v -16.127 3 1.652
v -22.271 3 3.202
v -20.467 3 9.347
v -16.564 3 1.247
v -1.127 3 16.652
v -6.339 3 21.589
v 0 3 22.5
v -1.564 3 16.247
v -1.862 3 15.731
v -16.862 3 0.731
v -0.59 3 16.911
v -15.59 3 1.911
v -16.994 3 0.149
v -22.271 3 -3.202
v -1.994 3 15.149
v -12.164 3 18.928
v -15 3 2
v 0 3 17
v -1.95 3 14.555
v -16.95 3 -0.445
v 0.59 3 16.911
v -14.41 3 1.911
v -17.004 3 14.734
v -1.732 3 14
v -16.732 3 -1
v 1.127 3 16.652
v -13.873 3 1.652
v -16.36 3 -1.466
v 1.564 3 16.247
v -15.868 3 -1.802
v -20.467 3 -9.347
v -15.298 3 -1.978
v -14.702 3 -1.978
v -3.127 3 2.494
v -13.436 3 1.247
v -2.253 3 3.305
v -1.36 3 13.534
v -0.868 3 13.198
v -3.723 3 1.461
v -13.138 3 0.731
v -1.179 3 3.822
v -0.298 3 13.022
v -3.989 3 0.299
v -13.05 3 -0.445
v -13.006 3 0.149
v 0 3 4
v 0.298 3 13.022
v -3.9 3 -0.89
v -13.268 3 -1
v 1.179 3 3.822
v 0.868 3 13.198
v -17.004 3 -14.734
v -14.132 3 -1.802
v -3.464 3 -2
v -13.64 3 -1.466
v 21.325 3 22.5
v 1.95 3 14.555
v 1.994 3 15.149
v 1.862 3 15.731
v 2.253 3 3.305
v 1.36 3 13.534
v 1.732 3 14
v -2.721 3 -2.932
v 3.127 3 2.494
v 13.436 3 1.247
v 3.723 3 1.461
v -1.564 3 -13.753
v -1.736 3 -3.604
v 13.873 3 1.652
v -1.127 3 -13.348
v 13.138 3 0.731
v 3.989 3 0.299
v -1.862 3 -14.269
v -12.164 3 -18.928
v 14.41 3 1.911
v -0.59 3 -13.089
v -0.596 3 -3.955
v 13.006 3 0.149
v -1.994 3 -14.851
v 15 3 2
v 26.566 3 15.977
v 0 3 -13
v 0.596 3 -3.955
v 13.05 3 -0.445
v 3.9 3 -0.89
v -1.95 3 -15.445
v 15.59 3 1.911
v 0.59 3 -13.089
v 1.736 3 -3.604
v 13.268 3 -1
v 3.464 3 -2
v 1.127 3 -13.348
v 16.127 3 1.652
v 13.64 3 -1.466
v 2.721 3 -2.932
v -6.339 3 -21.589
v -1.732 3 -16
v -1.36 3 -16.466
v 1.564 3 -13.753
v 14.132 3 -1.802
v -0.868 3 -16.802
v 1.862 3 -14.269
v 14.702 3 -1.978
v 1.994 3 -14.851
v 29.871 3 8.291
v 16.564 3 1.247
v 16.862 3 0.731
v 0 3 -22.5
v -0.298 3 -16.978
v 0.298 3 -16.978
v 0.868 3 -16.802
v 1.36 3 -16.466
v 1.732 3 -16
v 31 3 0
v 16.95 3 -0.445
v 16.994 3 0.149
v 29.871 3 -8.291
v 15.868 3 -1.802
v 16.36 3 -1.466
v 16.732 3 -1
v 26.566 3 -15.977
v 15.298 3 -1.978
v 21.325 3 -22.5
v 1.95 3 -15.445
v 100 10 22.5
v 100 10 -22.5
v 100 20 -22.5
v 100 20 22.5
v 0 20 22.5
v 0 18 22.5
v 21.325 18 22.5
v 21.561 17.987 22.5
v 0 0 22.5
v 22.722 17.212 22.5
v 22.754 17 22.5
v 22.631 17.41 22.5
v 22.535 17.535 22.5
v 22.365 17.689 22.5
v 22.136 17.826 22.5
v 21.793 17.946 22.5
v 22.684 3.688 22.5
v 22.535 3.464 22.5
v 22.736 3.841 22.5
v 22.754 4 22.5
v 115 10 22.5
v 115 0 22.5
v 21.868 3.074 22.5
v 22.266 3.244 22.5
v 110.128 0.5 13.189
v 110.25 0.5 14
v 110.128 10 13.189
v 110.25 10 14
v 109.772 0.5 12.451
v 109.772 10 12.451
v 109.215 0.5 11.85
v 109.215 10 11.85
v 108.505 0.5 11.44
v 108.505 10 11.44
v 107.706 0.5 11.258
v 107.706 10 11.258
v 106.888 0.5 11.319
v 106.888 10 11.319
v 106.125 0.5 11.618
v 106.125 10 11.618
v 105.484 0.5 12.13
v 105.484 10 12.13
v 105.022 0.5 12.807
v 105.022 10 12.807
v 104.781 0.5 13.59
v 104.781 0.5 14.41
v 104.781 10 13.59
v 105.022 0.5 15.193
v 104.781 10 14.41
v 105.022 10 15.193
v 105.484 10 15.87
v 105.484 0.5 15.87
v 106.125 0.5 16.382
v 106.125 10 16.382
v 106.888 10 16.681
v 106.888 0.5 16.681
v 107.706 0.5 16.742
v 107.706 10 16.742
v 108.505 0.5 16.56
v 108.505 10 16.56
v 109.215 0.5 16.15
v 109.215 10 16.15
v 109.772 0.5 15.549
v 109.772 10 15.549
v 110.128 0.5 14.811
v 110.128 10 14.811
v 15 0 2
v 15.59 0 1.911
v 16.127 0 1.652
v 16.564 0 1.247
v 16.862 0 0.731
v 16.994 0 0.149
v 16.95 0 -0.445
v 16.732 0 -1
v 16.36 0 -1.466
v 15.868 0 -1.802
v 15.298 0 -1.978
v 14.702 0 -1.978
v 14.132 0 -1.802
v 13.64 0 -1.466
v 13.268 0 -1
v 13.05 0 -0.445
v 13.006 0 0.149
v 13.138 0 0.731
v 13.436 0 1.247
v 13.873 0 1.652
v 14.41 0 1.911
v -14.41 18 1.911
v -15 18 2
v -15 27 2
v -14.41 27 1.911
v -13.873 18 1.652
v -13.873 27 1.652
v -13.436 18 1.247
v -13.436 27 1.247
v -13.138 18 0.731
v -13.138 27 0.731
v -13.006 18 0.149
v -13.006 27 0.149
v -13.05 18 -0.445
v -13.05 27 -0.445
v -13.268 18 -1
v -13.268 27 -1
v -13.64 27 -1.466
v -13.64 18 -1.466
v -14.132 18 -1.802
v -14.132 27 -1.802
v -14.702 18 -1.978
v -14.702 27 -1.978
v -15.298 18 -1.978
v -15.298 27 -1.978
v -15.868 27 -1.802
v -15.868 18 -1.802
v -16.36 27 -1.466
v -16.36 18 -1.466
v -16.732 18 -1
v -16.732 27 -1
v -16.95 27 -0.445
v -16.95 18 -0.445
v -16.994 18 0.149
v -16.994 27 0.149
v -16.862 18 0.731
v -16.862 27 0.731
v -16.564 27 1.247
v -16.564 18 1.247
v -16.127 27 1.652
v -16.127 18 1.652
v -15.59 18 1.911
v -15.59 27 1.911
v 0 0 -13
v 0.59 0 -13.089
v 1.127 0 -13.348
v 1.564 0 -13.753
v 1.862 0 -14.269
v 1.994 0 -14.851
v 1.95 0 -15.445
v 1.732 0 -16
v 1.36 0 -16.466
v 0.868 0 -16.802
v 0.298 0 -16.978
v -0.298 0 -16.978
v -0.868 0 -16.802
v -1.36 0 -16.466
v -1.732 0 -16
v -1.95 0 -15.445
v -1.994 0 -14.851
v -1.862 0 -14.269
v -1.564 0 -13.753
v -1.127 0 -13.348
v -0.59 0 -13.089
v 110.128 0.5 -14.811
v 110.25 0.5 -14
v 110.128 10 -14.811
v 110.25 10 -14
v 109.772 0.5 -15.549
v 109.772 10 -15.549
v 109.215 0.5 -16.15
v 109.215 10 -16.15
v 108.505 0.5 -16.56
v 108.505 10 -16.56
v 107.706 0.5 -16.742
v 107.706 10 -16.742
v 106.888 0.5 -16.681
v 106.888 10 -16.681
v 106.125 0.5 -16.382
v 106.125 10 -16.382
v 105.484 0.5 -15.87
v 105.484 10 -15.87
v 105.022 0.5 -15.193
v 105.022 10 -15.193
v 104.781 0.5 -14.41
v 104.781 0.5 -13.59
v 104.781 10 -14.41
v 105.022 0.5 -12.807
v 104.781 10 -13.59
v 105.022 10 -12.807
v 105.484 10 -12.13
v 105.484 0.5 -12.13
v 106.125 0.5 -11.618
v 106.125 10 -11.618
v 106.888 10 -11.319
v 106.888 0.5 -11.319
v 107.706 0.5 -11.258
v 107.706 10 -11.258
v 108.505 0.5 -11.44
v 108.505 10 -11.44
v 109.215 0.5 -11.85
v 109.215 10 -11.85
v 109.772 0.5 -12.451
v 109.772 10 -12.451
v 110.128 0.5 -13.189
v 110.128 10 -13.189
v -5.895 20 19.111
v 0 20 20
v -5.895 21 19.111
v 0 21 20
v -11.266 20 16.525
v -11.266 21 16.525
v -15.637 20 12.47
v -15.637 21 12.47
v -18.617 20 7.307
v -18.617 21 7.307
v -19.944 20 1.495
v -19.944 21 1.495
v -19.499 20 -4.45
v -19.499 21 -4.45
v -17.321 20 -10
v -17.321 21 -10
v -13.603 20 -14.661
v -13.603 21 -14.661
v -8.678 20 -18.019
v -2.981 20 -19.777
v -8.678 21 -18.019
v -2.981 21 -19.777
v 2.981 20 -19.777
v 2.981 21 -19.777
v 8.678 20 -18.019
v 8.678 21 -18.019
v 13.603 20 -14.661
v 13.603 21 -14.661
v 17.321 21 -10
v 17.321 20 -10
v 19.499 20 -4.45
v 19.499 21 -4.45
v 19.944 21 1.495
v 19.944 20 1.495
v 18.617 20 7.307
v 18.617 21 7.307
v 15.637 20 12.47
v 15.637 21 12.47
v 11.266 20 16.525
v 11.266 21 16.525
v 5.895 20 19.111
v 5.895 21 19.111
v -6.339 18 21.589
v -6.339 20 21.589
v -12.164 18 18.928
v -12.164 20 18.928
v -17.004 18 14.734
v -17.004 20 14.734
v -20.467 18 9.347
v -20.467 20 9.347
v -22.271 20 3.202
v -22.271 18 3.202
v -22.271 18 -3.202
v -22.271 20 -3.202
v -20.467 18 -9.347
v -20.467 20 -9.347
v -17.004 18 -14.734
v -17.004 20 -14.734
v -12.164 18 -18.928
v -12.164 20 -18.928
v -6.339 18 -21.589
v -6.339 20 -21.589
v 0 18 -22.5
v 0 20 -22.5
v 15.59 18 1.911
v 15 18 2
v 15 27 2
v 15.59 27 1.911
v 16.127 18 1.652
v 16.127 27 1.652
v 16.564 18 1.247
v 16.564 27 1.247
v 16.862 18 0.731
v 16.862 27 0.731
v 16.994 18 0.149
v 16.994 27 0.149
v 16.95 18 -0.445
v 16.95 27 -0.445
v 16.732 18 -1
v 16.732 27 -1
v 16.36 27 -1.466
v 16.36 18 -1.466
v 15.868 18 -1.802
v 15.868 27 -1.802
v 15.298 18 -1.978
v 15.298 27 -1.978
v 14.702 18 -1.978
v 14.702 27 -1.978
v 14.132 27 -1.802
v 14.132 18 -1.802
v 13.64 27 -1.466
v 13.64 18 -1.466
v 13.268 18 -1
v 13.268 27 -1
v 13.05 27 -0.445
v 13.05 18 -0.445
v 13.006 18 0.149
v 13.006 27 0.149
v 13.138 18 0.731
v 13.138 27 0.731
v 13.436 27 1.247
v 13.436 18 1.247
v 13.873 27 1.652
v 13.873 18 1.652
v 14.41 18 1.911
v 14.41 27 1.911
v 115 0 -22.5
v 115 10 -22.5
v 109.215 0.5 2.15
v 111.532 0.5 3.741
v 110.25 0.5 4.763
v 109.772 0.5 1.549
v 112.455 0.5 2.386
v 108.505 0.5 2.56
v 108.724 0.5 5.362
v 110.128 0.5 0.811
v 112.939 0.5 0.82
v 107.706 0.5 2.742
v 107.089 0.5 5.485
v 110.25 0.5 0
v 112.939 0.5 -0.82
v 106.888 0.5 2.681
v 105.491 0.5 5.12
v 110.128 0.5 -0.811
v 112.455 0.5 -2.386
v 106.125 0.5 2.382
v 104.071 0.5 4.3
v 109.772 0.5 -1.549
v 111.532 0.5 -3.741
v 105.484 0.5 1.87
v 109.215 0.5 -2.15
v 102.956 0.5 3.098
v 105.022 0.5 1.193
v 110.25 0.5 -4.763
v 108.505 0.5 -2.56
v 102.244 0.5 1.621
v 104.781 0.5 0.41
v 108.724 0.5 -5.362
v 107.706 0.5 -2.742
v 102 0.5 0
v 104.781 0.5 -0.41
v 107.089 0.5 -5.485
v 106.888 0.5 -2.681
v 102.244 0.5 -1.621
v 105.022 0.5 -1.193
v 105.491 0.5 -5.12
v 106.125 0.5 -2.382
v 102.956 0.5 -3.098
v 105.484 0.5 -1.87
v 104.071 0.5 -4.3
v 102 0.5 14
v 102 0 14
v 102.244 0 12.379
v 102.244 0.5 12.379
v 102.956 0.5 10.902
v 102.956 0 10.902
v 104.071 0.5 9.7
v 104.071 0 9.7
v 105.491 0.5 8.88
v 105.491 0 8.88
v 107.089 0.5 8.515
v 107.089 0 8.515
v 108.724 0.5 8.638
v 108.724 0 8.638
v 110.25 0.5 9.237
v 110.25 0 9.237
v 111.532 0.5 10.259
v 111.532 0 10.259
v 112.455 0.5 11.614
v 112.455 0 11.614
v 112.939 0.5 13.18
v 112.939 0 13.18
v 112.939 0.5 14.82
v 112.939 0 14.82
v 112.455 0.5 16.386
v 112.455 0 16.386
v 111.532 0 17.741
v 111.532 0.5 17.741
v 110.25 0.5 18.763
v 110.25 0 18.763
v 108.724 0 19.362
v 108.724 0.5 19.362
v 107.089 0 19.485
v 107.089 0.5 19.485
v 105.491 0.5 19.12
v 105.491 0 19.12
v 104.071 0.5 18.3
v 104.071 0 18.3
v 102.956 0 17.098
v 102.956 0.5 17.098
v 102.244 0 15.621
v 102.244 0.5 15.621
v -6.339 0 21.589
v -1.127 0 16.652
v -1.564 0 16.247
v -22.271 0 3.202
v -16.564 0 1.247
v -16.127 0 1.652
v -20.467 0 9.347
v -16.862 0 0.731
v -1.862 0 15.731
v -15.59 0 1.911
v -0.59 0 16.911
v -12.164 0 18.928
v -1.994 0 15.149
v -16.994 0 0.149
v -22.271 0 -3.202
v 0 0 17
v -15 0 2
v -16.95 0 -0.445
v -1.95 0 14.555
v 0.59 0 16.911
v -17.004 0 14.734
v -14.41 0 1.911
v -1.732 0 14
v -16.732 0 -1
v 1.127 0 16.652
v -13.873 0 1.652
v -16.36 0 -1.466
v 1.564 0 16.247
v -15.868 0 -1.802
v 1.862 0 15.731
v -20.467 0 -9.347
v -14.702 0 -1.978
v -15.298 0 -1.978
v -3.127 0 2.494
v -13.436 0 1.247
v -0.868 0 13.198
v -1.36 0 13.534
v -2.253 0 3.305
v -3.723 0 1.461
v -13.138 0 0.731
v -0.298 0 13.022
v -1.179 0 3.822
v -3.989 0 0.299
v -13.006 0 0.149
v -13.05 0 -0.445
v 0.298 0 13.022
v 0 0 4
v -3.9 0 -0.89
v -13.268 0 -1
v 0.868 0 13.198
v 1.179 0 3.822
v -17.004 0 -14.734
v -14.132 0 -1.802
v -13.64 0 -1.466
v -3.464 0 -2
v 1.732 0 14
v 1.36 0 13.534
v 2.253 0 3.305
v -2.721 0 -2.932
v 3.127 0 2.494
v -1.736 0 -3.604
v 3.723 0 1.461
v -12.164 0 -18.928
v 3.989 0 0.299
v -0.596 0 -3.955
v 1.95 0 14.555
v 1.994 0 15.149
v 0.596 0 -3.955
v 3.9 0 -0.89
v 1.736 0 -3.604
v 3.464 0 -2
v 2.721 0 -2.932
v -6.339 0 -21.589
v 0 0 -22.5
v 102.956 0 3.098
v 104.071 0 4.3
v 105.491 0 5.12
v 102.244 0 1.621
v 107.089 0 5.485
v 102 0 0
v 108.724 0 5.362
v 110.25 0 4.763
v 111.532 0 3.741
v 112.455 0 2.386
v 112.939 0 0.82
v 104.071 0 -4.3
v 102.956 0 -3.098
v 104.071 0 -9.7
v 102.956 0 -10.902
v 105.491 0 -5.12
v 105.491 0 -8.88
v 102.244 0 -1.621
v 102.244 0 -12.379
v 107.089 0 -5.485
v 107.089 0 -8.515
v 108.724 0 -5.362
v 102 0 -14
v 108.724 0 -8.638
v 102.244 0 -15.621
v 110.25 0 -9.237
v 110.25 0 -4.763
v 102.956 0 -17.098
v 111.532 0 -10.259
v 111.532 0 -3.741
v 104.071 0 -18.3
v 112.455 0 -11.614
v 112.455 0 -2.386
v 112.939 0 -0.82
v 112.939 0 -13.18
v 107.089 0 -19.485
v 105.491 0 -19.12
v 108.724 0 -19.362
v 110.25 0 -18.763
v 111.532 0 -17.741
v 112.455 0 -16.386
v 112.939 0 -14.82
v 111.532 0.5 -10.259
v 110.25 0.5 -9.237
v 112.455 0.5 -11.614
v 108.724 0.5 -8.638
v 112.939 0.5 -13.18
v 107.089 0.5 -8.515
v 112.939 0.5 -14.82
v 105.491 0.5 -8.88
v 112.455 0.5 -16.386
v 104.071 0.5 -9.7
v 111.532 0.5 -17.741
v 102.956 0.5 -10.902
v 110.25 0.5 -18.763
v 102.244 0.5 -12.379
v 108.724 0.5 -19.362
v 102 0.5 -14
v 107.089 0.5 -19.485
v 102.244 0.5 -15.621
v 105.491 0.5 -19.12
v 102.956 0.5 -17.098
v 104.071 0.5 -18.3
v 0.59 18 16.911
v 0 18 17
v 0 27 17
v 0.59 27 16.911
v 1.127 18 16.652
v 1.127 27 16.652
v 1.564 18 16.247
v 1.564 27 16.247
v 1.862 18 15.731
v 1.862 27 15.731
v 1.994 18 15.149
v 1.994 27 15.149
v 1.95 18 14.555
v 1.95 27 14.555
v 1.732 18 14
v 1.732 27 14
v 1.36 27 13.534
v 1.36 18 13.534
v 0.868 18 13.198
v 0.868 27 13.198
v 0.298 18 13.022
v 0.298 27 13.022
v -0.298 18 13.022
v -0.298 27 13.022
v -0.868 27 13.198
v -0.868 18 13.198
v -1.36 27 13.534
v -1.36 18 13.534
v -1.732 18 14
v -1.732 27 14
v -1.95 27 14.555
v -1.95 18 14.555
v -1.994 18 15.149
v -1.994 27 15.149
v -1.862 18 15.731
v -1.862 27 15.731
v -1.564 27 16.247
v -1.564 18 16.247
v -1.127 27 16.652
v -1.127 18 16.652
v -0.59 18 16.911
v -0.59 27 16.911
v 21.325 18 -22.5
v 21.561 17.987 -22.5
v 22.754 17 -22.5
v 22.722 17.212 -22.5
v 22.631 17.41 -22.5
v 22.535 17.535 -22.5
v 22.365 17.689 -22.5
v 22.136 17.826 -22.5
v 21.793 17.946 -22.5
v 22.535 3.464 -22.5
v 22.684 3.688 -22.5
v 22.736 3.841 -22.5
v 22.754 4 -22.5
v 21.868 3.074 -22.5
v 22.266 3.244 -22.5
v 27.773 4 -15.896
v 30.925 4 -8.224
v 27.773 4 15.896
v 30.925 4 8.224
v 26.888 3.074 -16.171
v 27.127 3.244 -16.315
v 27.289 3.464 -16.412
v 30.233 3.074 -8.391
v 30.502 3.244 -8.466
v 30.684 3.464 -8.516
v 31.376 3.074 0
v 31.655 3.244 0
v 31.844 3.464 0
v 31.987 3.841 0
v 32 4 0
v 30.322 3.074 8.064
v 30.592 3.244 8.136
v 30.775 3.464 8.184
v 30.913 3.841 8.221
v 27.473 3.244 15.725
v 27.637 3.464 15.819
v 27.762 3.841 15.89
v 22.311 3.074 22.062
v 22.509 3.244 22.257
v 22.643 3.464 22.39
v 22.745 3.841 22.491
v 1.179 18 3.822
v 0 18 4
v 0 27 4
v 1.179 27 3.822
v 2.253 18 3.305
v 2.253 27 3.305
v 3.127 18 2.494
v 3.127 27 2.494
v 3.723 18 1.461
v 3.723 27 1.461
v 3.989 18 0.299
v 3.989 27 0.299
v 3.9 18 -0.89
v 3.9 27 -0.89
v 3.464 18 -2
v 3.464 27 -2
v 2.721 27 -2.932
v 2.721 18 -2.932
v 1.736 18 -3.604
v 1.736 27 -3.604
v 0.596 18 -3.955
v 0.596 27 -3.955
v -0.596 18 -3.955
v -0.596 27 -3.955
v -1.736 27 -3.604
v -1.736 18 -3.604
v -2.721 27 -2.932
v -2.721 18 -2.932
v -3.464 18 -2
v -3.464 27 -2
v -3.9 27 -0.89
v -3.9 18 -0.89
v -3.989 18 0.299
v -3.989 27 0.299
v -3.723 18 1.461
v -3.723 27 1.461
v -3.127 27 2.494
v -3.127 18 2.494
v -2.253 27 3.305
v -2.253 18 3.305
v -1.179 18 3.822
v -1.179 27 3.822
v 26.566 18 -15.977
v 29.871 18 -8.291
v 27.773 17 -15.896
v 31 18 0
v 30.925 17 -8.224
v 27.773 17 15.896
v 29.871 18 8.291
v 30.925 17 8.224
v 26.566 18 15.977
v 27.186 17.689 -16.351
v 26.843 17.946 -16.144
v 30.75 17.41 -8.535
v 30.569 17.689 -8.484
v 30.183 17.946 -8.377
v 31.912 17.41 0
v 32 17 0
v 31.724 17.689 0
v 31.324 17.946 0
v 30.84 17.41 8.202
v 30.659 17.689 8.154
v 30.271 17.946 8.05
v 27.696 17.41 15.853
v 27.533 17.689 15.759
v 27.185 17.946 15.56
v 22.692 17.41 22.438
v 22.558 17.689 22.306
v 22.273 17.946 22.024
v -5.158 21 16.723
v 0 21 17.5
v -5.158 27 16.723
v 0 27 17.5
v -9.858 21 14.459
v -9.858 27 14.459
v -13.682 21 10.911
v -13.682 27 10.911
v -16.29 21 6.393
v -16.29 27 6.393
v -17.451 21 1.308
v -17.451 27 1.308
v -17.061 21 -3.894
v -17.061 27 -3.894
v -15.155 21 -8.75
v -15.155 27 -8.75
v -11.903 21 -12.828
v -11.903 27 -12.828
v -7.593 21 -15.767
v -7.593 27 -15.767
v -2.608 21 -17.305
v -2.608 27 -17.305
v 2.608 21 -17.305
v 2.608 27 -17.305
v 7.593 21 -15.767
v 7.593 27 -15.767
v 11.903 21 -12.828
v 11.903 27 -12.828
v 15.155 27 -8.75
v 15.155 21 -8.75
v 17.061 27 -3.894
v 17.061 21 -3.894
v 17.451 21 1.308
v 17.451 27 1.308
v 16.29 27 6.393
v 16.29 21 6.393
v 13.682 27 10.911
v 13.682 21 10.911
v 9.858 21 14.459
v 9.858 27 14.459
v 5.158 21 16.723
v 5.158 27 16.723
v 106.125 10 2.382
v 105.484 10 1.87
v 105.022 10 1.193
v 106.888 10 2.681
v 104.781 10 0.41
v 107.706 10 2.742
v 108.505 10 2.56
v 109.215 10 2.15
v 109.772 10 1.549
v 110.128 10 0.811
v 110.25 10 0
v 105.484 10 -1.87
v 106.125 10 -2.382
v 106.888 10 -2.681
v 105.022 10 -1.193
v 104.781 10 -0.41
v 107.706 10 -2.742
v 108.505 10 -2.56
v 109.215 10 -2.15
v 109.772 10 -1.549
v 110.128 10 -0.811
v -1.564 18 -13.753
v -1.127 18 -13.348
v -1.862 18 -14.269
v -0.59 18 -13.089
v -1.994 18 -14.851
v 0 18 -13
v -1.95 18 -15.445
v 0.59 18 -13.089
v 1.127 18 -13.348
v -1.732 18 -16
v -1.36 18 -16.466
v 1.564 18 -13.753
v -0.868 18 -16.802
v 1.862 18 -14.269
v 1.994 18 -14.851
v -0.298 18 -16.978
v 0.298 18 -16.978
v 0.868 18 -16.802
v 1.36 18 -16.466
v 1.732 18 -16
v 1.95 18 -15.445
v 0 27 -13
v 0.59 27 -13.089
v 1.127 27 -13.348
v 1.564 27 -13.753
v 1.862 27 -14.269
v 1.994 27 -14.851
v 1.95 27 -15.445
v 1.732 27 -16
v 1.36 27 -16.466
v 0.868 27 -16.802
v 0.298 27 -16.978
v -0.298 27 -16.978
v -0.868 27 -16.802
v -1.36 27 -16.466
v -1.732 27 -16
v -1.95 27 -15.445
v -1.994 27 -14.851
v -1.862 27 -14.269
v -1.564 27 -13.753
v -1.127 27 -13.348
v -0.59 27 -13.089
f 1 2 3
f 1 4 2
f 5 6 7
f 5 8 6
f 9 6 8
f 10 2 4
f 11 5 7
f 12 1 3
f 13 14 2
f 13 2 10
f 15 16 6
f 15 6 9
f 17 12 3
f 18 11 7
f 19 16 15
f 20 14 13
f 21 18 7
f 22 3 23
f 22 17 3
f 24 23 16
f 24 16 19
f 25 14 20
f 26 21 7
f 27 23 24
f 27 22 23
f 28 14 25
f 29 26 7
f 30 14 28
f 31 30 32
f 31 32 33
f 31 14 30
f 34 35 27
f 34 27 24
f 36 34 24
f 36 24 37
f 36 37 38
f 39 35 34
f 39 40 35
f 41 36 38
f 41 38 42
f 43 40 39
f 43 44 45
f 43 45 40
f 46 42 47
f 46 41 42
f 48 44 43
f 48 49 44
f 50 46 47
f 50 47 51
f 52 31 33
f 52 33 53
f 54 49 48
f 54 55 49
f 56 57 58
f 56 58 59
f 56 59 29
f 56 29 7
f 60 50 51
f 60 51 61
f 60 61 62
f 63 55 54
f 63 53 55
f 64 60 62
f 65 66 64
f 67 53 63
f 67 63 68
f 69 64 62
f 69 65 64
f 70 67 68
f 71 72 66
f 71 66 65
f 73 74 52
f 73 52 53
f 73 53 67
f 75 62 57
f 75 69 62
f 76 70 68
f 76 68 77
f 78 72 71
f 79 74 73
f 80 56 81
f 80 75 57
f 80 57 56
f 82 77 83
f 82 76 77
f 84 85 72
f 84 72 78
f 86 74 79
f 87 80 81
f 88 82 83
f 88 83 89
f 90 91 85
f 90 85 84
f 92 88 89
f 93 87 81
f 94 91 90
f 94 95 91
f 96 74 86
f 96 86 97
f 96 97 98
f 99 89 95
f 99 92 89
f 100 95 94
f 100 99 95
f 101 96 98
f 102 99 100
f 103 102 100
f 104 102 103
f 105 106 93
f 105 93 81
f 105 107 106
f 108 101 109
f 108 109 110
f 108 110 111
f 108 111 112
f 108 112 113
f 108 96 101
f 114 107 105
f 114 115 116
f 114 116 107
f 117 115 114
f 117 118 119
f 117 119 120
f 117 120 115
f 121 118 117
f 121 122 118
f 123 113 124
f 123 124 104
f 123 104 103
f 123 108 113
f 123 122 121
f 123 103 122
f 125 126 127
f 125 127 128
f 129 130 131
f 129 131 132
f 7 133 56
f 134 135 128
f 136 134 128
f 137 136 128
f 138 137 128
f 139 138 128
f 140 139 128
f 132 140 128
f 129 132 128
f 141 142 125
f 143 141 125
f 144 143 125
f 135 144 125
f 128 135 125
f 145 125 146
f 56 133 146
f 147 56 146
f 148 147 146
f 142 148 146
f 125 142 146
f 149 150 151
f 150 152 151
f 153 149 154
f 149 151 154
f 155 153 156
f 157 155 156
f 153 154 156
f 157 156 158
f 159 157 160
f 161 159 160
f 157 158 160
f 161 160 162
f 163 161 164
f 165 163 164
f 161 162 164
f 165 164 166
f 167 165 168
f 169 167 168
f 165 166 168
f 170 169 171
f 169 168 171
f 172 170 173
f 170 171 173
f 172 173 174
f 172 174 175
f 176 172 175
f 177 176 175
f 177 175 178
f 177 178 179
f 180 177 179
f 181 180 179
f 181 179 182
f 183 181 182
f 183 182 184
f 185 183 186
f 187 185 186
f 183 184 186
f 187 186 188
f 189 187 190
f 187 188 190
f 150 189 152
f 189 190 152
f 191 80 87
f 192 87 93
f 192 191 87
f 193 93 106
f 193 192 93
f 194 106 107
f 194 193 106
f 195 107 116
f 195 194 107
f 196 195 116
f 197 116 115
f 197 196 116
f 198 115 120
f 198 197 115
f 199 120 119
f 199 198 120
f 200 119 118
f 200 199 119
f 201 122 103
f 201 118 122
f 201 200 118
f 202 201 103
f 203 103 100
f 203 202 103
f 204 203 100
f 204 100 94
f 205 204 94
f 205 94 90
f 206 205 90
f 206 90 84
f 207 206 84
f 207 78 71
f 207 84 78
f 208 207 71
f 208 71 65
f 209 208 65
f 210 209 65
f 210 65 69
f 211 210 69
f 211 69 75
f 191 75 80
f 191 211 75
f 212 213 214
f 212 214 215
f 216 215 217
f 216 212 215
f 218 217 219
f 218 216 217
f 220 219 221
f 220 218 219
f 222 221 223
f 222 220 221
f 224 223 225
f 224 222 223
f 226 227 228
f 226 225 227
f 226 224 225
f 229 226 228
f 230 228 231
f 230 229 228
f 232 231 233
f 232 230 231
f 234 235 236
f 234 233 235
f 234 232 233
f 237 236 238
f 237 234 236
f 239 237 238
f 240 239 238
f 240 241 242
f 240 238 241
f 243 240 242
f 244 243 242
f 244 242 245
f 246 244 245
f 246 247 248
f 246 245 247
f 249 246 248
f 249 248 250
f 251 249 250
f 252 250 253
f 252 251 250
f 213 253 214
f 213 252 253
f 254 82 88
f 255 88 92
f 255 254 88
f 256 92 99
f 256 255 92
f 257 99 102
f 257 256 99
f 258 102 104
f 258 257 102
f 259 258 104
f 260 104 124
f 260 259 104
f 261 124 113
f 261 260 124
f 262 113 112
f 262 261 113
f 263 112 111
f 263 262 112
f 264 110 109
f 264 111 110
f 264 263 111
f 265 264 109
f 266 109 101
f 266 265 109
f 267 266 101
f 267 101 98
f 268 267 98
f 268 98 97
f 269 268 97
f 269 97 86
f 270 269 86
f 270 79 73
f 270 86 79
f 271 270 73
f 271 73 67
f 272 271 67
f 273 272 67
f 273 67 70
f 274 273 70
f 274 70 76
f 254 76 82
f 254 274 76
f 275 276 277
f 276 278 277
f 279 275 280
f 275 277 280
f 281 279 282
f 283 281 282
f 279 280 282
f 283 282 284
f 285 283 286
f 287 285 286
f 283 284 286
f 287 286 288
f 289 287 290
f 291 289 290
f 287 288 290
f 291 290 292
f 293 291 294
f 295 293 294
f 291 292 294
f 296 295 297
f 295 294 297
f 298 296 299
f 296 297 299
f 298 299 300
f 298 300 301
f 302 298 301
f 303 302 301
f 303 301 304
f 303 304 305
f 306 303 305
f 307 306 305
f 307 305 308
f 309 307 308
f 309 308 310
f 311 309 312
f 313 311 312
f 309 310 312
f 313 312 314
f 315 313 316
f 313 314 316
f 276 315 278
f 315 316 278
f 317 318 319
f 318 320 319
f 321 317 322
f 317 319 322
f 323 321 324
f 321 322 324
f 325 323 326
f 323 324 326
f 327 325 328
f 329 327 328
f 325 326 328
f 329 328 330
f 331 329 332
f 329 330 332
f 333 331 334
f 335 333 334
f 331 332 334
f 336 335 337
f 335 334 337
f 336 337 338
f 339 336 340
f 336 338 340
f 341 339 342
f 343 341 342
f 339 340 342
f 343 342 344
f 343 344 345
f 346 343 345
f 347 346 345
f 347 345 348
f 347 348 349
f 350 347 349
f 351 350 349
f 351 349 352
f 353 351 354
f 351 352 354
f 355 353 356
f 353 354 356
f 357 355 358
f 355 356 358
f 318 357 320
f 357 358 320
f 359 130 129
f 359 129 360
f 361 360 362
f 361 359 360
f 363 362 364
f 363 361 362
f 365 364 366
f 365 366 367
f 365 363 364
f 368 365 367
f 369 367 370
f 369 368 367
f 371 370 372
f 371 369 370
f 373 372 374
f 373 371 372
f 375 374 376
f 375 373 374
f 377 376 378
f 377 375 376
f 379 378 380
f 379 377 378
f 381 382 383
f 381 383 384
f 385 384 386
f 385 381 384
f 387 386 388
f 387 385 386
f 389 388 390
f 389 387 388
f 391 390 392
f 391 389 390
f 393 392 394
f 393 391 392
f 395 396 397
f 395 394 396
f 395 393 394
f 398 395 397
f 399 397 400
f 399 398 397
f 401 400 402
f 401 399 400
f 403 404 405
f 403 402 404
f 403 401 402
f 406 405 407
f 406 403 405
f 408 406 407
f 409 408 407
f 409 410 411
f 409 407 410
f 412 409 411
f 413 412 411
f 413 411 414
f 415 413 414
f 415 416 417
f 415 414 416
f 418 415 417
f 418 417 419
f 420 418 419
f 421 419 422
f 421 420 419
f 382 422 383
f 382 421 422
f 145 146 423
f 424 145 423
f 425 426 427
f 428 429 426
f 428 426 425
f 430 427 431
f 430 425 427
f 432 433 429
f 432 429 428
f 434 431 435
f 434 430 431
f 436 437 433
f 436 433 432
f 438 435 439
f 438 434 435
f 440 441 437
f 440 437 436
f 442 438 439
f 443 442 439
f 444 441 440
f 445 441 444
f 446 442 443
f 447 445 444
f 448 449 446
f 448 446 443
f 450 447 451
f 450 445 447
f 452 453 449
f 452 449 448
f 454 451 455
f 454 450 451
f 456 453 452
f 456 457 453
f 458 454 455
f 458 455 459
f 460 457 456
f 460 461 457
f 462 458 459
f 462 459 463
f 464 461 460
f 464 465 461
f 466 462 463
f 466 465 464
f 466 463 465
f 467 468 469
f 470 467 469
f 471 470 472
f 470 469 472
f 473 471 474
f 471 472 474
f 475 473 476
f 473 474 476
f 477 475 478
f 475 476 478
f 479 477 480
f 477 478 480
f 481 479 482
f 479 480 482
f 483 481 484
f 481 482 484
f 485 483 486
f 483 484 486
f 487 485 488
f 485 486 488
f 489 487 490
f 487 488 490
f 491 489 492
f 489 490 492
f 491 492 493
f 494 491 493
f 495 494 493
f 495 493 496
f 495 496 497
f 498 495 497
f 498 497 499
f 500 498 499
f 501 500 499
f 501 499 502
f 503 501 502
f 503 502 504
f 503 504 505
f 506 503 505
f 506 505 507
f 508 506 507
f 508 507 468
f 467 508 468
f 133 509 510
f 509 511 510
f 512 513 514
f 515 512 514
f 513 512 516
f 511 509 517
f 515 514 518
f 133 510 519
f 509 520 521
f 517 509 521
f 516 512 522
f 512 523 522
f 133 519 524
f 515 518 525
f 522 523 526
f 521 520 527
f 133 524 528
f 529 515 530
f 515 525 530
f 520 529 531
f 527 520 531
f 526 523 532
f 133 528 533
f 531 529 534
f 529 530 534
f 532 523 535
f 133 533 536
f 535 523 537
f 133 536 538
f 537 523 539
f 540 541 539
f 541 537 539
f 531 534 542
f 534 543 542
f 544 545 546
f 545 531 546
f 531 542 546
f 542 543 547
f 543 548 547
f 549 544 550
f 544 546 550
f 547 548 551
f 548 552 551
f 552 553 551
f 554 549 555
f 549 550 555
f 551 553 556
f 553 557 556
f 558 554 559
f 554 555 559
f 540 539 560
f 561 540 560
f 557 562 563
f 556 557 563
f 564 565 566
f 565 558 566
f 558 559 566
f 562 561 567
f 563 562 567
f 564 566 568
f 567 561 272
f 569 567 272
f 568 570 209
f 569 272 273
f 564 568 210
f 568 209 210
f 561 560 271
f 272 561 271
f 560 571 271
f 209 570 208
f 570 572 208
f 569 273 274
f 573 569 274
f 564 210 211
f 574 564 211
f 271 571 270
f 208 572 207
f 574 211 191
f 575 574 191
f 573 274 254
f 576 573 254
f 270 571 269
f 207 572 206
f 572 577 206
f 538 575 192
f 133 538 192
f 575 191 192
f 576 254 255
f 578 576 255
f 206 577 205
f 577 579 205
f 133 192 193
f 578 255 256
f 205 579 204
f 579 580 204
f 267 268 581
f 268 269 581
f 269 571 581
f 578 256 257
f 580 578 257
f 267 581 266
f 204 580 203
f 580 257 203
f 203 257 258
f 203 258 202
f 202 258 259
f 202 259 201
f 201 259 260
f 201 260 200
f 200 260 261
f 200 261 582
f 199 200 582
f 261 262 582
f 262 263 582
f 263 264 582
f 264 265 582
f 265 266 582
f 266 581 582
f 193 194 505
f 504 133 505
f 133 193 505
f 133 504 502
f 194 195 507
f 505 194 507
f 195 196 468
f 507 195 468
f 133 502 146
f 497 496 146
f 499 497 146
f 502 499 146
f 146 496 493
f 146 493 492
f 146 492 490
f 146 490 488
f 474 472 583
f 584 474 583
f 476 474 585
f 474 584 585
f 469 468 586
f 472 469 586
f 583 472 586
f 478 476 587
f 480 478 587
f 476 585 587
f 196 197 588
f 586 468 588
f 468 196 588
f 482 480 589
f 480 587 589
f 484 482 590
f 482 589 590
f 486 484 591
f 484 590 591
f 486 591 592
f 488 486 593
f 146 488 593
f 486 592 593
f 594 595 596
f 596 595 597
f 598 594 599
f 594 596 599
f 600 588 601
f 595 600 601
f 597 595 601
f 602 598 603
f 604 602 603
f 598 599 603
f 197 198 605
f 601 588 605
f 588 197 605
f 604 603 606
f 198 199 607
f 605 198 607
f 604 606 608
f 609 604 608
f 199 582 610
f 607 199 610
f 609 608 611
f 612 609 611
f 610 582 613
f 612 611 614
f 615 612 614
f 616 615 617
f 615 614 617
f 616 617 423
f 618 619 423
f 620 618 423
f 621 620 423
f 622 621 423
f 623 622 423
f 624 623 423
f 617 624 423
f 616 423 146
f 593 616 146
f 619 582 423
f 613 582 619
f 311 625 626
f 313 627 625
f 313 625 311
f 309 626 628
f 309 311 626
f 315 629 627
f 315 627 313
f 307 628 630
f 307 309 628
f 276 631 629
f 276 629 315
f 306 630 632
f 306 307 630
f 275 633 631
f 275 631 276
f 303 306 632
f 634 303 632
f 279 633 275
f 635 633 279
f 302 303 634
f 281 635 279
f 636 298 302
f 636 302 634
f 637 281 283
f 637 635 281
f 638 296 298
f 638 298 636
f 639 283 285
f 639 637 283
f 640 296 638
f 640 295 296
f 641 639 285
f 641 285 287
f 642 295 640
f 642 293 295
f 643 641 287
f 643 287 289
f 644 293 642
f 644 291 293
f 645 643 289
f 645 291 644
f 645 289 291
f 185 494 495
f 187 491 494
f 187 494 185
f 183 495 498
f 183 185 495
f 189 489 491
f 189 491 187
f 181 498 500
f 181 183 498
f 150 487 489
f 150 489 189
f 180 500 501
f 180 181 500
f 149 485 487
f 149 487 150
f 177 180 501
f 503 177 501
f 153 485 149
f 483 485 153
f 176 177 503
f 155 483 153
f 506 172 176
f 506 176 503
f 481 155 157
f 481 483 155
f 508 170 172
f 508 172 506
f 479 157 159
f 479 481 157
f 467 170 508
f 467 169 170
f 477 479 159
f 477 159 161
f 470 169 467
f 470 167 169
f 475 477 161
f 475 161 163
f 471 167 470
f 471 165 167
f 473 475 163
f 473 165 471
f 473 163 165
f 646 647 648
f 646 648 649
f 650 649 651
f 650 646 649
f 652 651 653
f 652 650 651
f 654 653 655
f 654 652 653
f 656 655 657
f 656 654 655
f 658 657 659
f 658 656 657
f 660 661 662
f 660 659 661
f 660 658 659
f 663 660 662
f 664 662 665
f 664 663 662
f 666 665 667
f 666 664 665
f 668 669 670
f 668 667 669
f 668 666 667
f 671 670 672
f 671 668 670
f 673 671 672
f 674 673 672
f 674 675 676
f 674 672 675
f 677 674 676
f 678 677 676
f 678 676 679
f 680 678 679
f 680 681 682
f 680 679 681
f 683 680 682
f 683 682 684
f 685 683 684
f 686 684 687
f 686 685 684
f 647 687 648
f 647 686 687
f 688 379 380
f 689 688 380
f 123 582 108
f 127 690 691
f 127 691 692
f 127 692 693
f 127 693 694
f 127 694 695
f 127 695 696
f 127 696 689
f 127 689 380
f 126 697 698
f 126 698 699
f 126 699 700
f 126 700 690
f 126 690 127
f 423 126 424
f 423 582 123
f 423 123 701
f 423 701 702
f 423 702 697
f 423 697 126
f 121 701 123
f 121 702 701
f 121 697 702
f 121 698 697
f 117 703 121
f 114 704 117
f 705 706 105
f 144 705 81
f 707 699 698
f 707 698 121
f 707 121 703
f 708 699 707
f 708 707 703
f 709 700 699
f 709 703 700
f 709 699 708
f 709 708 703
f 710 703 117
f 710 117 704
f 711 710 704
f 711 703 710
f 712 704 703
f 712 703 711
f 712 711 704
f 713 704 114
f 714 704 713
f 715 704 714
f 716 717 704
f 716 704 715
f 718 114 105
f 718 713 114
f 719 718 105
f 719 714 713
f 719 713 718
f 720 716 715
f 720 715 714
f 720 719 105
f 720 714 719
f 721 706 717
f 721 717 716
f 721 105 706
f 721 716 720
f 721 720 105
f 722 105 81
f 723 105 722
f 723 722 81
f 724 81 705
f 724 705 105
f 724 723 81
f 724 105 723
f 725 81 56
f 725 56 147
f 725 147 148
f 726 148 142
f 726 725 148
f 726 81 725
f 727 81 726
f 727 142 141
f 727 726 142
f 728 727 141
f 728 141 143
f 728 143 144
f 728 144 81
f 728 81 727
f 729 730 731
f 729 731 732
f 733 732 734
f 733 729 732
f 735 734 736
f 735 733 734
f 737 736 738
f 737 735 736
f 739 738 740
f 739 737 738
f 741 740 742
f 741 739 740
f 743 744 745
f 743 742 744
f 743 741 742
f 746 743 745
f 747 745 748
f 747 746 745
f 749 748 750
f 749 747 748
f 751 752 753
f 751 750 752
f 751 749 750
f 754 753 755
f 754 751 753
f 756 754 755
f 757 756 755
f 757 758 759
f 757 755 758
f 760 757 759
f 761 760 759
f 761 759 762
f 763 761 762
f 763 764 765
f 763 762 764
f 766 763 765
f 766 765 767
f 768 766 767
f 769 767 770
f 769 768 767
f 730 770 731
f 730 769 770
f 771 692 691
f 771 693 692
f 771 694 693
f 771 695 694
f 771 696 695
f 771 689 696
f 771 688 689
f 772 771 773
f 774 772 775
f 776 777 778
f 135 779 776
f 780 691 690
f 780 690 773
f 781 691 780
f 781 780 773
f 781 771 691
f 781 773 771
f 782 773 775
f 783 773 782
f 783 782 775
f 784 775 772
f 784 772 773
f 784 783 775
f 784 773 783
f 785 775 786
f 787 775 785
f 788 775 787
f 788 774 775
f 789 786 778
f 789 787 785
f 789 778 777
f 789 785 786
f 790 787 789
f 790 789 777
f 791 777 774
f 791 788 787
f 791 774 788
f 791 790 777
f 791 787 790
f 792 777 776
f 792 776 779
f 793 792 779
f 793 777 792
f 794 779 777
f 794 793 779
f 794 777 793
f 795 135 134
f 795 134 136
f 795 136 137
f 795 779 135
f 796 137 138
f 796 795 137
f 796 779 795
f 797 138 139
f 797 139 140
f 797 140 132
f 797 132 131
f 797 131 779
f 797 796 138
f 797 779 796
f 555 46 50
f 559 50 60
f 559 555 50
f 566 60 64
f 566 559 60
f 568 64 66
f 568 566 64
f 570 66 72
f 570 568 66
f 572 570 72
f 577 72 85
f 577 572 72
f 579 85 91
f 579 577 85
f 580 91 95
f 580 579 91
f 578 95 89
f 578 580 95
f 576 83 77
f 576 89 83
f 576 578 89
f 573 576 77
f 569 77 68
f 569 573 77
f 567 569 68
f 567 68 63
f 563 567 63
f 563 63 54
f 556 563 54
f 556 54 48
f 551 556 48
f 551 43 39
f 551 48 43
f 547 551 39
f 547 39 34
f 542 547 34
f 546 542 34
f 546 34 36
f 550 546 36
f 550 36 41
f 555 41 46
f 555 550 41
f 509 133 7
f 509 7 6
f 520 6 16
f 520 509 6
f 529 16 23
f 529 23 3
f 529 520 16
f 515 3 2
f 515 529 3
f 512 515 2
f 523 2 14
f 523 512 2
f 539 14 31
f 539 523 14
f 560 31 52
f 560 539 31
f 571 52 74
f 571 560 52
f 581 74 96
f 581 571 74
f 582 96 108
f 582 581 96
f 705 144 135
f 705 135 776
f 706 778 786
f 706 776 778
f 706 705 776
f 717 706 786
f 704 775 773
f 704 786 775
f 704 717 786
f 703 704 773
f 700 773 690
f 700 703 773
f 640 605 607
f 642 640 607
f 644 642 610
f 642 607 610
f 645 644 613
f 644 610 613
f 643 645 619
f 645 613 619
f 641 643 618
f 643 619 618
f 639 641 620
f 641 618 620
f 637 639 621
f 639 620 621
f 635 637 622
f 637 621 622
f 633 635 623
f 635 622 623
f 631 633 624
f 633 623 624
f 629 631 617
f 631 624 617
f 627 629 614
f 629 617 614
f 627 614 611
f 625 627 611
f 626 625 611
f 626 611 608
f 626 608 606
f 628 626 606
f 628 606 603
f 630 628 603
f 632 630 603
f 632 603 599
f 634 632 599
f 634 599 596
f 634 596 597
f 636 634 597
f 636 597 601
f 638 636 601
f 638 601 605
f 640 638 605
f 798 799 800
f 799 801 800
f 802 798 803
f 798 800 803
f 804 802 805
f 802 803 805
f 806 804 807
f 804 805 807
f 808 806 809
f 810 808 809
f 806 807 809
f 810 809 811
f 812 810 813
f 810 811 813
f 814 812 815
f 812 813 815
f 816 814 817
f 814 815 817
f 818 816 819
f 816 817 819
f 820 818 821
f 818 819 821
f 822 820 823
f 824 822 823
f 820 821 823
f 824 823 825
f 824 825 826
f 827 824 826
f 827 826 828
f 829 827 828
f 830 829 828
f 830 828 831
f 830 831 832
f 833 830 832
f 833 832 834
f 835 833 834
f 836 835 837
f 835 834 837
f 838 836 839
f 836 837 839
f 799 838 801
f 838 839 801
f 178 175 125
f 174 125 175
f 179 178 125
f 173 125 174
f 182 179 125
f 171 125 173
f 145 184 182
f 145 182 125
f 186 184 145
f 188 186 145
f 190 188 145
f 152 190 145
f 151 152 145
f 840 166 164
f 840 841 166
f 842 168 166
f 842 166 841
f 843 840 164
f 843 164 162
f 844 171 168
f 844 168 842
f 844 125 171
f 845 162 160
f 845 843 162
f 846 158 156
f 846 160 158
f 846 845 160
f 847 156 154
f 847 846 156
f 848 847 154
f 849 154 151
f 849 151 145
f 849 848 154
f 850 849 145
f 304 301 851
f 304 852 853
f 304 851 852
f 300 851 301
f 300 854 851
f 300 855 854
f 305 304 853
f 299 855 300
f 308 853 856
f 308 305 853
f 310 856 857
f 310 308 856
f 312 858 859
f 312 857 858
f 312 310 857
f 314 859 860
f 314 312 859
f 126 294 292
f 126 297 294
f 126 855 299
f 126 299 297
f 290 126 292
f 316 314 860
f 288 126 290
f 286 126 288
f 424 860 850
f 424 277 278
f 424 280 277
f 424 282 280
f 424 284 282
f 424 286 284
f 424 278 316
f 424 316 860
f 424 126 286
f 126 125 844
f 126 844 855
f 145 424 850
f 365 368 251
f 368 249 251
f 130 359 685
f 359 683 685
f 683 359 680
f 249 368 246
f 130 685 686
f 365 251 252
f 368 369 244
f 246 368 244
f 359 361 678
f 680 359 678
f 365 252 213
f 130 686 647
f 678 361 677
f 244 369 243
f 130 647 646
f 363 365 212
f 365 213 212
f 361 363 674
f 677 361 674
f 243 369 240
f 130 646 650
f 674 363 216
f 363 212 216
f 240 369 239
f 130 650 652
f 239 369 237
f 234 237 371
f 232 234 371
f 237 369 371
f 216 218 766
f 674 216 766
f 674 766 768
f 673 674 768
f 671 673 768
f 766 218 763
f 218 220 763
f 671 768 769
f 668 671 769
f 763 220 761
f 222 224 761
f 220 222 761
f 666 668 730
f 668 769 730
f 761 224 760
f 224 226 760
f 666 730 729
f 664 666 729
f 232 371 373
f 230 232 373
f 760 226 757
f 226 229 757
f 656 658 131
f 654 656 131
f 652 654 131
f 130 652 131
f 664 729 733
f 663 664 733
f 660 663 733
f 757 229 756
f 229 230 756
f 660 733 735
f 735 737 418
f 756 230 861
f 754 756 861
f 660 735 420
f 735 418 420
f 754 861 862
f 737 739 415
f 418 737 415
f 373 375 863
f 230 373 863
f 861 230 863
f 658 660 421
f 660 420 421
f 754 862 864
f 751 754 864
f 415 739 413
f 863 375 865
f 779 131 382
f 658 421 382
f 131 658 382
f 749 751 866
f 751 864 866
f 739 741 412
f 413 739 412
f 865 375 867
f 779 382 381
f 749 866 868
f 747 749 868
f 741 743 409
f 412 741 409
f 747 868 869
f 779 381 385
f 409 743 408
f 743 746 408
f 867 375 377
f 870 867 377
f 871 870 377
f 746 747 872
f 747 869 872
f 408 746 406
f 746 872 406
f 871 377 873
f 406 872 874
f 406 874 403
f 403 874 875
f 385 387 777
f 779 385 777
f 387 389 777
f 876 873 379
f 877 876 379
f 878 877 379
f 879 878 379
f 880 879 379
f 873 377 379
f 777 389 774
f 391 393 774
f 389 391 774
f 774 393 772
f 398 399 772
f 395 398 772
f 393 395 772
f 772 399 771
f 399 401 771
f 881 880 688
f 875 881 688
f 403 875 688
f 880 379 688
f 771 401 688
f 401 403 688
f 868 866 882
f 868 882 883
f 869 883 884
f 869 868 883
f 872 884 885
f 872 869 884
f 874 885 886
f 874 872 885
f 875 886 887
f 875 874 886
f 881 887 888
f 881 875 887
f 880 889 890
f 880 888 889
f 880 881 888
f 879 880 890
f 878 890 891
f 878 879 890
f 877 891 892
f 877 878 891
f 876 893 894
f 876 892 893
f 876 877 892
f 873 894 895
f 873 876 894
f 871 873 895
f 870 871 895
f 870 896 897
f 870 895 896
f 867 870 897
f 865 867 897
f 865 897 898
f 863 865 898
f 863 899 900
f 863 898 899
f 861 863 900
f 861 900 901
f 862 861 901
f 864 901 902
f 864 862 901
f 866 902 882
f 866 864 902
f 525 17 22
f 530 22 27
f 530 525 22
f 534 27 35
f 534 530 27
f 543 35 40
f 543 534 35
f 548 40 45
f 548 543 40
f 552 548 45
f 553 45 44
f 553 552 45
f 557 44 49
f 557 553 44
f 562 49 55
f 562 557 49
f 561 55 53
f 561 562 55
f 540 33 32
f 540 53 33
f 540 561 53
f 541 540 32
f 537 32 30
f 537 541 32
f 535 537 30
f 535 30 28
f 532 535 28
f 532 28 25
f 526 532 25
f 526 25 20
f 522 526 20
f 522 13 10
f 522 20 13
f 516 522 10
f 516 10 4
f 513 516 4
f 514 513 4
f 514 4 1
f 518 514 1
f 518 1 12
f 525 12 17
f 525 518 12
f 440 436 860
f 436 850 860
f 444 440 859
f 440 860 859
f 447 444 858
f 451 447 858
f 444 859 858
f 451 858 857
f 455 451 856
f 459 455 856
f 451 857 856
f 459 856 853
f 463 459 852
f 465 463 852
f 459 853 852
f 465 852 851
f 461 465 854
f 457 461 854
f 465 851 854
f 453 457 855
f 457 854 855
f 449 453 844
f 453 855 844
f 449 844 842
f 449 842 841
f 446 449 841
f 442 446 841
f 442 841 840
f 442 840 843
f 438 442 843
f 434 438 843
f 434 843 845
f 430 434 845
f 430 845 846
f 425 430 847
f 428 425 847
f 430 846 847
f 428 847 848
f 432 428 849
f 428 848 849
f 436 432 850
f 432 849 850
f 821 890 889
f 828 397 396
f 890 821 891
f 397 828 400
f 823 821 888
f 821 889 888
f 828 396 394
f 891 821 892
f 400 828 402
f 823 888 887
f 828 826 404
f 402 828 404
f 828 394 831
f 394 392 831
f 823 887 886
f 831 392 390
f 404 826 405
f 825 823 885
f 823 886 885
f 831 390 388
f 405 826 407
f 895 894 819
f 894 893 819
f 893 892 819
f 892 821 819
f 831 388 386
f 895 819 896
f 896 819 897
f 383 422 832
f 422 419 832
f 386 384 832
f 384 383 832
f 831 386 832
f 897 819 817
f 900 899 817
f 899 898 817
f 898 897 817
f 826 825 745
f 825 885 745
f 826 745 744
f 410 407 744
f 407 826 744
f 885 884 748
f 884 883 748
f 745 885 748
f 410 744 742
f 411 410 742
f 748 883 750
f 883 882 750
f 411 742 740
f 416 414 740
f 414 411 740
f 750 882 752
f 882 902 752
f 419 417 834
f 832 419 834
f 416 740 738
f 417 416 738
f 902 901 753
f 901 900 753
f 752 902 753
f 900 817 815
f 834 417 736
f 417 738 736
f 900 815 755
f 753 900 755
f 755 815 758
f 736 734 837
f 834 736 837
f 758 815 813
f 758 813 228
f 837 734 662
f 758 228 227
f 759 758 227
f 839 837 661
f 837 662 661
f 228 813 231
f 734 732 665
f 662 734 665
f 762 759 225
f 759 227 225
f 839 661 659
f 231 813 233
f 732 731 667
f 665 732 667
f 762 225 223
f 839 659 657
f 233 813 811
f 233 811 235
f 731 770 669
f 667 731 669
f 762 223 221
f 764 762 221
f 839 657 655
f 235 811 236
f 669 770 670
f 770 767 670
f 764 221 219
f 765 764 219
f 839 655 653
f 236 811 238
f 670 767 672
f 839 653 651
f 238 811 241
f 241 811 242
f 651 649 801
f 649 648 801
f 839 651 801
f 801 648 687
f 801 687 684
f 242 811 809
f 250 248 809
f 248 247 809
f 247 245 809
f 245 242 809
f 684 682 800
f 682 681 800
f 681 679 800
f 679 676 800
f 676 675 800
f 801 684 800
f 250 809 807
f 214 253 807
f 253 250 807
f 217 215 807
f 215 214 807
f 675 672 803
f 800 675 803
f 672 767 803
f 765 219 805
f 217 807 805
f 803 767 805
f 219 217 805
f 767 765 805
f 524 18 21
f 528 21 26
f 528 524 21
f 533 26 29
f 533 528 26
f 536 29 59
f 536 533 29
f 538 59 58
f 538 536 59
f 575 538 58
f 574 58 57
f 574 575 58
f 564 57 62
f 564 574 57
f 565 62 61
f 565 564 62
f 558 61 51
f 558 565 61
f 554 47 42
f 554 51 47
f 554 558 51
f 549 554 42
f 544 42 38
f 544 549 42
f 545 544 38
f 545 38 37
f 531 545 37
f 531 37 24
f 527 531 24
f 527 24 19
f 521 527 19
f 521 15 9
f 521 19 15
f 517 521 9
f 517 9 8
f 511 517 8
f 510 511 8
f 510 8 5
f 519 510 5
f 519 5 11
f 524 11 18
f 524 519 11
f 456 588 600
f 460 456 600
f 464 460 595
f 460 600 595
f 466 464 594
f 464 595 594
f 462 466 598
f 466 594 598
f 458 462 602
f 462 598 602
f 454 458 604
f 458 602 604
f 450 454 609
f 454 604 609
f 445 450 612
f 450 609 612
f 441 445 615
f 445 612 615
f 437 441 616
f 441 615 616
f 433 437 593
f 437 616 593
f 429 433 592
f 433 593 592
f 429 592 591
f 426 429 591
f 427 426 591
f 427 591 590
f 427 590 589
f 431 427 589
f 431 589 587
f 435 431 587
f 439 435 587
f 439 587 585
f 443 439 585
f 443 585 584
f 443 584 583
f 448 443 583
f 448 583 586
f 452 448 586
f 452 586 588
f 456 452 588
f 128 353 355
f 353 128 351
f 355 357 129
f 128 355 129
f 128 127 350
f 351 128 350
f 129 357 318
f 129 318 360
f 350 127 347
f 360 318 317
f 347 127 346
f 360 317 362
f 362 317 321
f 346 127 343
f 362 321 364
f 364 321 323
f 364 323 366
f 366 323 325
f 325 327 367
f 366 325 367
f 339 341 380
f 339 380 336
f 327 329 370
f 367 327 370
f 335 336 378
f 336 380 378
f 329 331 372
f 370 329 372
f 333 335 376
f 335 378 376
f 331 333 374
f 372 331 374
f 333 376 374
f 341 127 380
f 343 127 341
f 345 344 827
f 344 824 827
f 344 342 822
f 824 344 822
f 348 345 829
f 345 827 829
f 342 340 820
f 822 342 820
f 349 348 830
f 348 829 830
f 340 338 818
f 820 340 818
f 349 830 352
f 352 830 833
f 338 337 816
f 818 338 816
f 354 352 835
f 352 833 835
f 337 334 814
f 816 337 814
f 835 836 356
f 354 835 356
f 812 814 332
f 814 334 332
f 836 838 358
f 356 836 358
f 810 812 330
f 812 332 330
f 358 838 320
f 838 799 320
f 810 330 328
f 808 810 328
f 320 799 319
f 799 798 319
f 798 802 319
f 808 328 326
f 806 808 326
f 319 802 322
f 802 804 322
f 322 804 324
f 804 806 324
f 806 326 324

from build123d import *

# Parameters (mm, degrees)
SKETCH_2_R                   = 1.5
EXTRUDE_1_DEPTH              = 20
CUT_EXTRUDE_START            = 3
SKETCH_4_R                   = 32
CUT_EXTRUDE_1_DEPTH          = 15
SKETCH_6_R                   = 2
SKETCH_6_R_2                 = 4
CUT_EXTRUDE_2_DEPTH          = 106.996462205
SKETCH_8_W                   = 15
SKETCH_8_H                   = 45
EXTRUDE_3_DEPTH              = 10
HOLE_WIZARD_M5_1_D           = 5.5
HOLE_WIZARD_M5_1_CBORE_D     = 11
HOLE_WIZARD_M5_1_CBORE_DEPTH = 0.5
FILLET_1_R                   = 1


with BuildPart() as part:
    # 草图2 → 凸台-拉伸1 (new body)
    with BuildSketch(Plane(origin=(0, 0, 0), x_dir=(1, 0, 0), z_dir=(0, 1, 0))):
        with BuildLine():
            Line((0, 22.5), (100, 22.5))
            Line((100, 22.5), (100, -22.5))
            Line((100, -22.5), (0, -22.5))
            ThreePointArc((0, -22.5), (-22.5, 0), (0, 22.5))
        make_face()
        with Locations(Location((-15, 0, 0), (0, 0, 270))):
            Circle(SKETCH_2_R, mode=Mode.SUBTRACT)
        with Locations(Location((0, 15, 0), (0, 0, 270))):
            Circle(SKETCH_2_R, mode=Mode.SUBTRACT)
        with Locations(Location((15, 0, 0), (0, 0, 270))):
            Circle(SKETCH_2_R, mode=Mode.SUBTRACT)
        with Locations(Location((0, -15, 0), (0, 0, 270))):
            Circle(SKETCH_2_R, mode=Mode.SUBTRACT)
    extrude(amount=EXTRUDE_1_DEPTH)

    # 草图4 → 切除-拉伸1 (cut)
    with BuildSketch(Plane(origin=(0, 0, 0), x_dir=(1, 0, 0), z_dir=(0, 1, 0)).offset(CUT_EXTRUDE_START)):
        Circle(SKETCH_4_R)
    extrude(amount=CUT_EXTRUDE_1_DEPTH, mode=Mode.SUBTRACT)

    # 草图5 → 旋转1 (revolve)
    with BuildSketch(Plane.XY, mode=Mode.PRIVATE) as revolve_1_sk:
        Polygon((0, 20), (-20, 20), (-20, 21), (-17.5, 21), (-17.5, 27), (0, 27), align=None)
    revolve(revolve_1_sk.sketch.rotate(Axis((0, 42.215312946, 0), (0, -1, 0)), 270), axis=Axis((0, 42.215312946, 0), (0, -1, 0)))

    # 草图6 → 切除-拉伸2 (cut, through all)
    with BuildSketch(Plane(origin=(0, 0, 0), x_dir=(1, 0, 0), z_dir=(0, 1, 0))):
        with Locations(Location((0, 15, 0), (0, 0, 270))):
            Circle(SKETCH_6_R)
        with Locations(Location((15, 0, 0), (0, 0, 270))):
            Circle(SKETCH_6_R)
        with Locations(Location((0, -15, 0), (0, 0, 270))):
            Circle(SKETCH_6_R)
        with Locations(Location((-15, 0, 0), (0, 0, 270))):
            Circle(SKETCH_6_R)
        with Locations(Location((0, 0, 0), (0, 0, 270))):
            Circle(SKETCH_6_R_2)
    extrude(amount=CUT_EXTRUDE_2_DEPTH, mode=Mode.SUBTRACT)

    # 草图8 → 凸台-拉伸3 (add)
    with BuildSketch(Plane(origin=(0, 0, 0), x_dir=(1, 0, 0), z_dir=(0, 1, 0))):
        with Locations((107.5, 0)):
            Rectangle(SKETCH_8_W, SKETCH_8_H)
    extrude(amount=EXTRUDE_3_DEPTH)

    # M5 六角头螺栓的柱形沉头孔1 (through all)
    with Locations(Plane(origin=(0, 0, 0), x_dir=(-1, 0, 0), z_dir=(0, -1, 0))):
        with Locations((-107.5, -14), (-107.5, 0), (-107.5, 14)):
            CounterBoreHole(HOLE_WIZARD_M5_1_D / 2, HOLE_WIZARD_M5_1_CBORE_D / 2, HOLE_WIZARD_M5_1_CBORE_DEPTH)

    # 圆角1
    fillet_1_edges = [part.edges().sort_by_distance(p)[0] for p in [
        (32, 3, 0),
        (32, 18, 0),
    ]]
    fillet(fillet_1_edges, radius=FILLET_1_R)


solid = part.part
